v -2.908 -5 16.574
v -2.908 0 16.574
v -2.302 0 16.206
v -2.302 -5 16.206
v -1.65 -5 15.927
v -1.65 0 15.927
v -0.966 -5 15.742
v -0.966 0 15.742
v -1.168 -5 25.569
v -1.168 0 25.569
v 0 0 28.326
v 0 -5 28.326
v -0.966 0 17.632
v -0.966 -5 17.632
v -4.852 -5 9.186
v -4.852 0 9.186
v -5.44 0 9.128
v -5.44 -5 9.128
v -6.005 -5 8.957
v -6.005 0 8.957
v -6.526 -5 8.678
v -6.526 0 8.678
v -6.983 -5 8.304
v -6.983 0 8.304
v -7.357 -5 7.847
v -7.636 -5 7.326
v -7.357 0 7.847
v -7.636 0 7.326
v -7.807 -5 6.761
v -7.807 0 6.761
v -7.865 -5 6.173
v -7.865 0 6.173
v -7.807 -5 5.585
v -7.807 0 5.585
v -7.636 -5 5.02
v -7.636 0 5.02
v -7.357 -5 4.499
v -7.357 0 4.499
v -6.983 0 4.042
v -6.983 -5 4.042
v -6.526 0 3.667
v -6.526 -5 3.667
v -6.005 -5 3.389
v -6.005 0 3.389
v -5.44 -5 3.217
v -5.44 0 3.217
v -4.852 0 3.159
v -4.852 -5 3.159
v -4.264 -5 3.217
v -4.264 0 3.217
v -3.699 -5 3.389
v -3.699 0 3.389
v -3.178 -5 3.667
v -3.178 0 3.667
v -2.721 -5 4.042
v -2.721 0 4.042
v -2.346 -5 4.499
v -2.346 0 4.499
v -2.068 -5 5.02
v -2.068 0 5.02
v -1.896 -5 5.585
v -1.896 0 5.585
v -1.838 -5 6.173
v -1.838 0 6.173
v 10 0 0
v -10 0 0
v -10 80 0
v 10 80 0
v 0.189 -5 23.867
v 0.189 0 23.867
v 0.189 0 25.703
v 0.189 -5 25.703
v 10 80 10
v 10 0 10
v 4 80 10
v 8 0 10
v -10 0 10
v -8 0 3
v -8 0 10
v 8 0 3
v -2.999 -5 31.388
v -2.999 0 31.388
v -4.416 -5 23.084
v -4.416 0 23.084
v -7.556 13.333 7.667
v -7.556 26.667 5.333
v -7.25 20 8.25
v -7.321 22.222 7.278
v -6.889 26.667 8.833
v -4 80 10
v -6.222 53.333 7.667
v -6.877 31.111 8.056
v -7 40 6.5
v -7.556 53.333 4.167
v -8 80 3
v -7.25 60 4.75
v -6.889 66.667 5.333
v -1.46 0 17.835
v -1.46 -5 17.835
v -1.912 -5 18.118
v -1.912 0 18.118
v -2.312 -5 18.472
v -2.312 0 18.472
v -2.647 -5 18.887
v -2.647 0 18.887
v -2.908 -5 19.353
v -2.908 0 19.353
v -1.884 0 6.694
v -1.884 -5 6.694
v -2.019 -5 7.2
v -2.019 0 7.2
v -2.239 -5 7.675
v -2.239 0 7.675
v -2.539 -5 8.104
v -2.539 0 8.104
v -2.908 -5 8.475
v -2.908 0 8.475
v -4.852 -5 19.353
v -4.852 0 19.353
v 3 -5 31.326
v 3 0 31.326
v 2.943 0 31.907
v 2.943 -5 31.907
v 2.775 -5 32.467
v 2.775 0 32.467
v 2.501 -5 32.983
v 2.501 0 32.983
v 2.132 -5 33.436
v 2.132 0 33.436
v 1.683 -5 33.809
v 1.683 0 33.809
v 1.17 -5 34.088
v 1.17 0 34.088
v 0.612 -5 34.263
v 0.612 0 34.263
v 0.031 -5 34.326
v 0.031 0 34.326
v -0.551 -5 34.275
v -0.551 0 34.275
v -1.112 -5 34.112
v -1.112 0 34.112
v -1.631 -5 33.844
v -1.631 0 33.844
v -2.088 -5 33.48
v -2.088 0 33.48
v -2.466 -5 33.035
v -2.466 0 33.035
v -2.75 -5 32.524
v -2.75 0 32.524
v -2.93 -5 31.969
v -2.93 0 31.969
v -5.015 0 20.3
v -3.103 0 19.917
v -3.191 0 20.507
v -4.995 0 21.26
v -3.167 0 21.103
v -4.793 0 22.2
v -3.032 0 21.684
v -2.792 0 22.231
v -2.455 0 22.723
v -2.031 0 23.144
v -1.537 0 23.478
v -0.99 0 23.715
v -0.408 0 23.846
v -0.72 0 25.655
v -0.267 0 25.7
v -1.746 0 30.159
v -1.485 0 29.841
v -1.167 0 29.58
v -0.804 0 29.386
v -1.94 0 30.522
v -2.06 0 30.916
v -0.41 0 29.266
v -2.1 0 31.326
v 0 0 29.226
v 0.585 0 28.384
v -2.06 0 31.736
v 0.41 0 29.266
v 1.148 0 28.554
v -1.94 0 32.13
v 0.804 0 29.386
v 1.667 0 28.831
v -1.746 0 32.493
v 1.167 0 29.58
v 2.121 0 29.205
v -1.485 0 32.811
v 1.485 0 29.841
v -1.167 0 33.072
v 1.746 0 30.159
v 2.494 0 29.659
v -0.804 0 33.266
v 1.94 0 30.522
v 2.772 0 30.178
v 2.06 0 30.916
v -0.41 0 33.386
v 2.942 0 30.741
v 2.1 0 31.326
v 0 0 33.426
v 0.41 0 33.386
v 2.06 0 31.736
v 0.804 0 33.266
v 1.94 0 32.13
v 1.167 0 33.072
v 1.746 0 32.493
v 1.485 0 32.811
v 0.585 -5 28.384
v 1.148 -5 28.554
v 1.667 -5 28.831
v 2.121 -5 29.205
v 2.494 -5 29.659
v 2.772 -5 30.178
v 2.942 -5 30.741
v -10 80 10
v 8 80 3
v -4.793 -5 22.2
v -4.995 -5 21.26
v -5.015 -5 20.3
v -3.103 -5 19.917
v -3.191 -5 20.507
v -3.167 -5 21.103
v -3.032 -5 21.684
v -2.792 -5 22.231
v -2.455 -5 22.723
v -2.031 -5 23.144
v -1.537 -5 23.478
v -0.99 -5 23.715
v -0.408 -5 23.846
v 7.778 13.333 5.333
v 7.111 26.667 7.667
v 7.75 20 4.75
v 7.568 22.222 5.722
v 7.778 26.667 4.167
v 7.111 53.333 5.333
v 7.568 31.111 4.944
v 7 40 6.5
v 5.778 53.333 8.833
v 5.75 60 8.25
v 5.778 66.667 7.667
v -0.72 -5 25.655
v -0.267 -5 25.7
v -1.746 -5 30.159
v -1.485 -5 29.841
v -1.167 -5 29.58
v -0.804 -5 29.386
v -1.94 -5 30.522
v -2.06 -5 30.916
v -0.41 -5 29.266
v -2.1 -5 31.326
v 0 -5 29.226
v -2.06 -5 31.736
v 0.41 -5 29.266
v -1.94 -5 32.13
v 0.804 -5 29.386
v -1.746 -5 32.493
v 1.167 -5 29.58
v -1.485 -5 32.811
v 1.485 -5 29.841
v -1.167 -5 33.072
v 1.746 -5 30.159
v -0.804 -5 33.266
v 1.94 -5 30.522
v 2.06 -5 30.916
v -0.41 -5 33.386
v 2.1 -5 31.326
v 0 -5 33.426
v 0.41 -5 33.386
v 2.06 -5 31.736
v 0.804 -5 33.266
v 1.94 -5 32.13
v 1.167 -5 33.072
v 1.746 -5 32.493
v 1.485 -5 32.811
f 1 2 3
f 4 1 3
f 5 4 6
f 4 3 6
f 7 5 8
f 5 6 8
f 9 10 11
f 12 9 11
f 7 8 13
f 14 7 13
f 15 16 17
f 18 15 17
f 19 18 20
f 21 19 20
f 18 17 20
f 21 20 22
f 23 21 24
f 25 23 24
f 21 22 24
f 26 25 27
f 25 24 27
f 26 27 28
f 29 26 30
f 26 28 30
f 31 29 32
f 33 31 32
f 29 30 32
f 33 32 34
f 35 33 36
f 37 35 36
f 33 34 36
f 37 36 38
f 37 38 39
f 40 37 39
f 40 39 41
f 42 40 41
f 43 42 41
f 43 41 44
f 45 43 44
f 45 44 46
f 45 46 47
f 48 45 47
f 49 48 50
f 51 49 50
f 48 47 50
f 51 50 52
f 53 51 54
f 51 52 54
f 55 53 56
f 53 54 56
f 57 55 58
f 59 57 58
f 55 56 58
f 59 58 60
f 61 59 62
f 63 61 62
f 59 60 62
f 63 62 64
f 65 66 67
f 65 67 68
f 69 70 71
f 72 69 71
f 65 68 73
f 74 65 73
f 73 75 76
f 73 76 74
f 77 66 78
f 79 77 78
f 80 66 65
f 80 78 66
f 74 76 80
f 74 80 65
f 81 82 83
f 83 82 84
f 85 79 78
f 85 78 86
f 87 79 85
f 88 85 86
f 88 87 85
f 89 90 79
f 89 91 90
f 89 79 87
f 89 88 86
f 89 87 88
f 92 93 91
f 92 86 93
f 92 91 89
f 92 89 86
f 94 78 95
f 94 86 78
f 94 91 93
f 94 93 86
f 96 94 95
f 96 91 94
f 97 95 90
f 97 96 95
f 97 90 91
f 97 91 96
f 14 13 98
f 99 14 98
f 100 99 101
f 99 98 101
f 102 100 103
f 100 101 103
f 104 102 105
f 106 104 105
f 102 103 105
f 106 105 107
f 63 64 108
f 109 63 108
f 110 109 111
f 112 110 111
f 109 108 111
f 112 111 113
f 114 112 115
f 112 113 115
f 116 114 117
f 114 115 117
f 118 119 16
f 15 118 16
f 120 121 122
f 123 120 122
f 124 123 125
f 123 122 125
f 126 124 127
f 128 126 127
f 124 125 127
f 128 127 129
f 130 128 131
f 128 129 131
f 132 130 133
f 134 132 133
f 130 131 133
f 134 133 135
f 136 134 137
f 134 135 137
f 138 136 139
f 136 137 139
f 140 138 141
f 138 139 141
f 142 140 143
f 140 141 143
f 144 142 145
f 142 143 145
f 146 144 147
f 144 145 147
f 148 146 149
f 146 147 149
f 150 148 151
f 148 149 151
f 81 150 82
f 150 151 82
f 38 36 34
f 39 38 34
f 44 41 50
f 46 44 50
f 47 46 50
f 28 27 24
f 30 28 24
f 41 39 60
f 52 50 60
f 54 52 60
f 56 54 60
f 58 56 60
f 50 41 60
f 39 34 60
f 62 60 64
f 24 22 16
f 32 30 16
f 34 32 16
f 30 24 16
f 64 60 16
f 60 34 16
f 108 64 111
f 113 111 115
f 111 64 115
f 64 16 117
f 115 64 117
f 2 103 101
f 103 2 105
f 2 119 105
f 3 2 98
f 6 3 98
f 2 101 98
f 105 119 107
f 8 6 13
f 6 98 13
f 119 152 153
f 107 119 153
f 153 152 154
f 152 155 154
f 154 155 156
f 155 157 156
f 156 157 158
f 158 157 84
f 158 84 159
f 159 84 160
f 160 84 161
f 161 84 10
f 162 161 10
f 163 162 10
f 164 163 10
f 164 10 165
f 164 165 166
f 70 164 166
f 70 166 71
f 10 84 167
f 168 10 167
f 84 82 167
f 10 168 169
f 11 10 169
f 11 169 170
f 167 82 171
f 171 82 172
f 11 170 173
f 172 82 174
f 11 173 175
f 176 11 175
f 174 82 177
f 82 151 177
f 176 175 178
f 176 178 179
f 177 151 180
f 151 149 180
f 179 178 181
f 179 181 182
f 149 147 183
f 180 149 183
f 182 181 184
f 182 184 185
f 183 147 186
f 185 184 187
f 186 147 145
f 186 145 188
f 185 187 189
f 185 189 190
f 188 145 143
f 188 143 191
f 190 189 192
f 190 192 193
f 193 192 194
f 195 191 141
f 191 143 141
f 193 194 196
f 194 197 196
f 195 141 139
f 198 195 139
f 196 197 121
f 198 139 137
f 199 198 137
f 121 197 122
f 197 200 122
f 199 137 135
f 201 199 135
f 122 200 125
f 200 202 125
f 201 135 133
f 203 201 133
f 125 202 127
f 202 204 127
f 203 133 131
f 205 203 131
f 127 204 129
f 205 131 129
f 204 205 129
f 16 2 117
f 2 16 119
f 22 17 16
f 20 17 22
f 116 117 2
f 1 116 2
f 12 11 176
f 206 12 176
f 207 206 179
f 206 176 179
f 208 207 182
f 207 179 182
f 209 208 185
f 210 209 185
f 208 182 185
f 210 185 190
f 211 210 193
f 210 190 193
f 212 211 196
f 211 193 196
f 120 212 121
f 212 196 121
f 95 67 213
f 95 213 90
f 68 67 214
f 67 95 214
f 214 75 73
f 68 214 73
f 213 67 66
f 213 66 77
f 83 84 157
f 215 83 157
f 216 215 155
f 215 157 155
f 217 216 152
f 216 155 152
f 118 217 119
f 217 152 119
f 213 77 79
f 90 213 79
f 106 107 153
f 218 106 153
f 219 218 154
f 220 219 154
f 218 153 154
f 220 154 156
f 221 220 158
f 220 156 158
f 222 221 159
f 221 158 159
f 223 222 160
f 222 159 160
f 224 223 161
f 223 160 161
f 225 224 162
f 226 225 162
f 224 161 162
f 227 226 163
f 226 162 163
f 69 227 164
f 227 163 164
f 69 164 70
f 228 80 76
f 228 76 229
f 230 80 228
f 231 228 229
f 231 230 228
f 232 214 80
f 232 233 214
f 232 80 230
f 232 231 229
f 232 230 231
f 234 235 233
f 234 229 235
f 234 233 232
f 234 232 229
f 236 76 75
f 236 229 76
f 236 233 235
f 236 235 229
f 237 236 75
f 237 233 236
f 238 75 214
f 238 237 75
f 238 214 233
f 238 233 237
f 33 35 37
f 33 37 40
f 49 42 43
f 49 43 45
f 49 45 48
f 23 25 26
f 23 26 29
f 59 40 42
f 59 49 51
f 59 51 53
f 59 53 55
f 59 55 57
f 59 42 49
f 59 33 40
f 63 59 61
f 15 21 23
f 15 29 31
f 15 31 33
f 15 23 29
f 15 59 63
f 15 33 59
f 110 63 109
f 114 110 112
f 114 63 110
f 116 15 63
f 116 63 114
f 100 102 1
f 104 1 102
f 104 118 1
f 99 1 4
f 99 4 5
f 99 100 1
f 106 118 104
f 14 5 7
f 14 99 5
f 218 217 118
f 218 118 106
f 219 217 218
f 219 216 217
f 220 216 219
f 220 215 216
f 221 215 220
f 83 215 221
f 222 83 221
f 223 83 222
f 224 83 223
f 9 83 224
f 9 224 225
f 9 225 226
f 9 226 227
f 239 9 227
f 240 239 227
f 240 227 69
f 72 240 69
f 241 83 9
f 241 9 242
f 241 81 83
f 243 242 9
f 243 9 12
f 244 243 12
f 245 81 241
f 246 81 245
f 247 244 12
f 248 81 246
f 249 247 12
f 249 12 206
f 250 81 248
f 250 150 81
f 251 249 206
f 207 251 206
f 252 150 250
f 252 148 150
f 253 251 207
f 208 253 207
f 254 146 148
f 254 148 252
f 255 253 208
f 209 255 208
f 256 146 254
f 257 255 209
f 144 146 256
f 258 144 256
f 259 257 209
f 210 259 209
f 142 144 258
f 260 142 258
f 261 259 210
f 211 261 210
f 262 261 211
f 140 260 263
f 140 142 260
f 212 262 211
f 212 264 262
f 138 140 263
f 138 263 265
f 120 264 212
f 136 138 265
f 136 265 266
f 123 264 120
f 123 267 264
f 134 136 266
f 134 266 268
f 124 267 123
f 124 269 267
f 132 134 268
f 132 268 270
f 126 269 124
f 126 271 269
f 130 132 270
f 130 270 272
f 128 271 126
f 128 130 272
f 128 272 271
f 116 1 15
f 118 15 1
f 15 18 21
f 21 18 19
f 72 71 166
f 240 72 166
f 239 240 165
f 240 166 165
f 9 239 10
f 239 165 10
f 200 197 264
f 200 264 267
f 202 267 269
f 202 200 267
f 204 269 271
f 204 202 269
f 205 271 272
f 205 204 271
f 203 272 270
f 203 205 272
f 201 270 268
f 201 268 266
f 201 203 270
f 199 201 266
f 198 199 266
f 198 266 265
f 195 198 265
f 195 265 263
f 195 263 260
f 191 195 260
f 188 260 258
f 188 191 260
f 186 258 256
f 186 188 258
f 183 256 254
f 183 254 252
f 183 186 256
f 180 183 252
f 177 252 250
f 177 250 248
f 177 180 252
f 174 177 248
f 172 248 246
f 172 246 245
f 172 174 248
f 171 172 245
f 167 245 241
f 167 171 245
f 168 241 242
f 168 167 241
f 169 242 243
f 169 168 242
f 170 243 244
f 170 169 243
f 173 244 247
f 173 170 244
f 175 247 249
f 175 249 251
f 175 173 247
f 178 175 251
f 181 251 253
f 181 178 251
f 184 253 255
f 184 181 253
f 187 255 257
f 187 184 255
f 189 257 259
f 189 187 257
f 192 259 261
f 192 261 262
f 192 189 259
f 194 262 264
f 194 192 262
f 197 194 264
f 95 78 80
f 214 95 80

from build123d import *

# Parameters (mm, degrees)
F0_W     = 20
F0_H     = 10
F1_DEPTH = 80
F2_W     = 16
F2_H     = 7
F5_R     = 2.1
F6_DEPTH = 5


with BuildPart() as f1:
    # F0 (on Front) → F1 (new body)
    with BuildSketch(Plane.XZ):
        with Locations((0, 5)):
            Rectangle(F0_W, F0_H)
    extrude(amount=-F1_DEPTH)

    # F2 (on face) → F4 section 0
    with BuildSketch(Plane.XZ):
        with Locations((0, 6.5)):
            Rectangle(F2_W, F2_H)
    # F3 (on face) → F4 section 1
    with BuildSketch(Plane(origin=(0, 80, 0), x_dir=(-1, 0, 0), z_dir=(0, 1, 0))):
        Polygon((4, 10), (-4, 10), (-8, 3), (8, 3), align=None)
    loft(mode=Mode.SUBTRACT)


with BuildPart() as f6:
    # F5 (on Front) → F6 (new body)
    with BuildSketch(Plane.XZ):
        with BuildLine():
            Line((-4.8518124968, 6.1728735454), (-4.8518124968, 9.1862847298))
            ThreePointArc((-4.8518124968, 9.1862847298), (-6.9826159798, 4.0420700624), (-1.8384013124, 6.1728735454))
            ThreePointArc((-1.8384013124, 6.1728735454), (-2.118757562, 7.4421480192), (-2.9076597649, 8.4752456095))
            Line((-2.9076597649, 8.4752456095), (-2.9076597649, 6.1728735454))
            Line((-2.9076597649, 6.1728735454), (-4.8518124968, 6.1728735454))
        make_face()
        with BuildLine():
            ThreePointArc((-2.9076597649, 8.4752456095), (-3.8167634067, 9.0029478108), (-4.8518124968, 9.1862847298))
            Line((-4.8518124968, 9.1862847298), (-4.8518124968, 6.1728735454))
            Line((-4.8518124968, 6.1728735454), (-2.9076597649, 6.1728735454))
            Line((-2.9076597649, 6.1728735454), (-2.9076597649, 8.4752456095))
        make_face()
        with BuildLine():
            ThreePointArc((-2.9076597649, 16.5737187745), (-4.1210807971, 17.7944757075), (-4.8518124968, 19.3528945454))
            Line((-4.8518124968, 19.3528945454), (-4.8518124968, 9.1862847298))
            ThreePointArc((-4.8518124968, 9.1862847298), (-3.8167634067, 9.0029478108), (-2.9076597649, 8.4752456095))
            Line((-2.9076597649, 8.4752456095), (-2.9076597649, 16.5737187745))
        make_face()
        with BuildLine():
            ThreePointArc((-0.9662810217, 17.6318659056), (-2.1195139064, 18.2864649445), (-2.9076597649, 19.3528945454))
            Line((-2.9076597649, 19.3528945454), (-2.9076597649, 16.5737187745))
            ThreePointArc((-2.9076597649, 16.5737187745), (-1.9811399388, 16.0546494321), (-0.9662810217, 15.7417063883))
            Line((-0.9662810217, 15.7417063883), (-0.9662810217, 17.6318659056))
        make_face()
        with BuildLine():
            Line((-2.9076597649, 19.3528945454), (-4.8518124968, 19.3528945454))
            ThreePointArc((-4.8518124968, 19.3528945454), (-4.1210807971, 17.7944757075), (-2.9076597649, 16.5737187745))
            Line((-2.9076597649, 16.5737187745), (-2.9076597649, 19.3528945454))
        make_face()
        with BuildLine():
            ThreePointArc((-1.1679330145, 25.5691985063), (-3.0562313548, 24.6715585269), (-4.4163428976, 23.0836275632))
            ThreePointArc((-4.4163428976, 23.0836275632), (-4.9954247383, 21.2604392671), (-4.8518124968, 19.3528945454))
            Line((-4.8518124968, 19.3528945454), (-2.9076597649, 19.3528945454))
            ThreePointArc((-2.9076597649, 19.3528945454), (-2.634816389, 22.4846688372), (0.1886498126, 23.8668744407))
            Line((0.1886498126, 23.8668744407), (0.1886498126, 25.7031494596))
            ThreePointArc((0.1886498126, 25.7031494596), (-0.4942009833, 25.6823489417), (-1.1679330145, 25.5691985063))
        make_face()
        with BuildLine():
            ThreePointArc((0, 28.3258753854), (-2.1433167436, 29.2267819295), (-2.9993481003, 31.388413161))
            Line((-2.9993481003, 31.388413161), (-4.4163428976, 23.0836275632))
            ThreePointArc((-4.4163428976, 23.0836275632), (-3.0562313548, 24.6715585269), (-1.1679330145, 25.5691985063))
            Line((-1.1679330145, 25.5691985063), (0, 28.3258753854))
        make_face()
        with BuildLine():
            ThreePointArc((0, 28.3258753854), (2.1213203436, 29.2045550419), (3, 31.3258753854))
            ThreePointArc((3, 31.3258753854), (0.0312705866, 34.3257124061), (-2.9993481003, 31.388413161))
            ThreePointArc((-2.9993481003, 31.388413161), (-2.1433167436, 29.2267819295), (0, 28.3258753854))
        make_face()
        with Locations((0, 31.3258753854)):
            Circle(F5_R, mode=Mode.SUBTRACT)
    extrude(amount=F6_DEPTH)


solid = Compound([f1.part, f6.part])
